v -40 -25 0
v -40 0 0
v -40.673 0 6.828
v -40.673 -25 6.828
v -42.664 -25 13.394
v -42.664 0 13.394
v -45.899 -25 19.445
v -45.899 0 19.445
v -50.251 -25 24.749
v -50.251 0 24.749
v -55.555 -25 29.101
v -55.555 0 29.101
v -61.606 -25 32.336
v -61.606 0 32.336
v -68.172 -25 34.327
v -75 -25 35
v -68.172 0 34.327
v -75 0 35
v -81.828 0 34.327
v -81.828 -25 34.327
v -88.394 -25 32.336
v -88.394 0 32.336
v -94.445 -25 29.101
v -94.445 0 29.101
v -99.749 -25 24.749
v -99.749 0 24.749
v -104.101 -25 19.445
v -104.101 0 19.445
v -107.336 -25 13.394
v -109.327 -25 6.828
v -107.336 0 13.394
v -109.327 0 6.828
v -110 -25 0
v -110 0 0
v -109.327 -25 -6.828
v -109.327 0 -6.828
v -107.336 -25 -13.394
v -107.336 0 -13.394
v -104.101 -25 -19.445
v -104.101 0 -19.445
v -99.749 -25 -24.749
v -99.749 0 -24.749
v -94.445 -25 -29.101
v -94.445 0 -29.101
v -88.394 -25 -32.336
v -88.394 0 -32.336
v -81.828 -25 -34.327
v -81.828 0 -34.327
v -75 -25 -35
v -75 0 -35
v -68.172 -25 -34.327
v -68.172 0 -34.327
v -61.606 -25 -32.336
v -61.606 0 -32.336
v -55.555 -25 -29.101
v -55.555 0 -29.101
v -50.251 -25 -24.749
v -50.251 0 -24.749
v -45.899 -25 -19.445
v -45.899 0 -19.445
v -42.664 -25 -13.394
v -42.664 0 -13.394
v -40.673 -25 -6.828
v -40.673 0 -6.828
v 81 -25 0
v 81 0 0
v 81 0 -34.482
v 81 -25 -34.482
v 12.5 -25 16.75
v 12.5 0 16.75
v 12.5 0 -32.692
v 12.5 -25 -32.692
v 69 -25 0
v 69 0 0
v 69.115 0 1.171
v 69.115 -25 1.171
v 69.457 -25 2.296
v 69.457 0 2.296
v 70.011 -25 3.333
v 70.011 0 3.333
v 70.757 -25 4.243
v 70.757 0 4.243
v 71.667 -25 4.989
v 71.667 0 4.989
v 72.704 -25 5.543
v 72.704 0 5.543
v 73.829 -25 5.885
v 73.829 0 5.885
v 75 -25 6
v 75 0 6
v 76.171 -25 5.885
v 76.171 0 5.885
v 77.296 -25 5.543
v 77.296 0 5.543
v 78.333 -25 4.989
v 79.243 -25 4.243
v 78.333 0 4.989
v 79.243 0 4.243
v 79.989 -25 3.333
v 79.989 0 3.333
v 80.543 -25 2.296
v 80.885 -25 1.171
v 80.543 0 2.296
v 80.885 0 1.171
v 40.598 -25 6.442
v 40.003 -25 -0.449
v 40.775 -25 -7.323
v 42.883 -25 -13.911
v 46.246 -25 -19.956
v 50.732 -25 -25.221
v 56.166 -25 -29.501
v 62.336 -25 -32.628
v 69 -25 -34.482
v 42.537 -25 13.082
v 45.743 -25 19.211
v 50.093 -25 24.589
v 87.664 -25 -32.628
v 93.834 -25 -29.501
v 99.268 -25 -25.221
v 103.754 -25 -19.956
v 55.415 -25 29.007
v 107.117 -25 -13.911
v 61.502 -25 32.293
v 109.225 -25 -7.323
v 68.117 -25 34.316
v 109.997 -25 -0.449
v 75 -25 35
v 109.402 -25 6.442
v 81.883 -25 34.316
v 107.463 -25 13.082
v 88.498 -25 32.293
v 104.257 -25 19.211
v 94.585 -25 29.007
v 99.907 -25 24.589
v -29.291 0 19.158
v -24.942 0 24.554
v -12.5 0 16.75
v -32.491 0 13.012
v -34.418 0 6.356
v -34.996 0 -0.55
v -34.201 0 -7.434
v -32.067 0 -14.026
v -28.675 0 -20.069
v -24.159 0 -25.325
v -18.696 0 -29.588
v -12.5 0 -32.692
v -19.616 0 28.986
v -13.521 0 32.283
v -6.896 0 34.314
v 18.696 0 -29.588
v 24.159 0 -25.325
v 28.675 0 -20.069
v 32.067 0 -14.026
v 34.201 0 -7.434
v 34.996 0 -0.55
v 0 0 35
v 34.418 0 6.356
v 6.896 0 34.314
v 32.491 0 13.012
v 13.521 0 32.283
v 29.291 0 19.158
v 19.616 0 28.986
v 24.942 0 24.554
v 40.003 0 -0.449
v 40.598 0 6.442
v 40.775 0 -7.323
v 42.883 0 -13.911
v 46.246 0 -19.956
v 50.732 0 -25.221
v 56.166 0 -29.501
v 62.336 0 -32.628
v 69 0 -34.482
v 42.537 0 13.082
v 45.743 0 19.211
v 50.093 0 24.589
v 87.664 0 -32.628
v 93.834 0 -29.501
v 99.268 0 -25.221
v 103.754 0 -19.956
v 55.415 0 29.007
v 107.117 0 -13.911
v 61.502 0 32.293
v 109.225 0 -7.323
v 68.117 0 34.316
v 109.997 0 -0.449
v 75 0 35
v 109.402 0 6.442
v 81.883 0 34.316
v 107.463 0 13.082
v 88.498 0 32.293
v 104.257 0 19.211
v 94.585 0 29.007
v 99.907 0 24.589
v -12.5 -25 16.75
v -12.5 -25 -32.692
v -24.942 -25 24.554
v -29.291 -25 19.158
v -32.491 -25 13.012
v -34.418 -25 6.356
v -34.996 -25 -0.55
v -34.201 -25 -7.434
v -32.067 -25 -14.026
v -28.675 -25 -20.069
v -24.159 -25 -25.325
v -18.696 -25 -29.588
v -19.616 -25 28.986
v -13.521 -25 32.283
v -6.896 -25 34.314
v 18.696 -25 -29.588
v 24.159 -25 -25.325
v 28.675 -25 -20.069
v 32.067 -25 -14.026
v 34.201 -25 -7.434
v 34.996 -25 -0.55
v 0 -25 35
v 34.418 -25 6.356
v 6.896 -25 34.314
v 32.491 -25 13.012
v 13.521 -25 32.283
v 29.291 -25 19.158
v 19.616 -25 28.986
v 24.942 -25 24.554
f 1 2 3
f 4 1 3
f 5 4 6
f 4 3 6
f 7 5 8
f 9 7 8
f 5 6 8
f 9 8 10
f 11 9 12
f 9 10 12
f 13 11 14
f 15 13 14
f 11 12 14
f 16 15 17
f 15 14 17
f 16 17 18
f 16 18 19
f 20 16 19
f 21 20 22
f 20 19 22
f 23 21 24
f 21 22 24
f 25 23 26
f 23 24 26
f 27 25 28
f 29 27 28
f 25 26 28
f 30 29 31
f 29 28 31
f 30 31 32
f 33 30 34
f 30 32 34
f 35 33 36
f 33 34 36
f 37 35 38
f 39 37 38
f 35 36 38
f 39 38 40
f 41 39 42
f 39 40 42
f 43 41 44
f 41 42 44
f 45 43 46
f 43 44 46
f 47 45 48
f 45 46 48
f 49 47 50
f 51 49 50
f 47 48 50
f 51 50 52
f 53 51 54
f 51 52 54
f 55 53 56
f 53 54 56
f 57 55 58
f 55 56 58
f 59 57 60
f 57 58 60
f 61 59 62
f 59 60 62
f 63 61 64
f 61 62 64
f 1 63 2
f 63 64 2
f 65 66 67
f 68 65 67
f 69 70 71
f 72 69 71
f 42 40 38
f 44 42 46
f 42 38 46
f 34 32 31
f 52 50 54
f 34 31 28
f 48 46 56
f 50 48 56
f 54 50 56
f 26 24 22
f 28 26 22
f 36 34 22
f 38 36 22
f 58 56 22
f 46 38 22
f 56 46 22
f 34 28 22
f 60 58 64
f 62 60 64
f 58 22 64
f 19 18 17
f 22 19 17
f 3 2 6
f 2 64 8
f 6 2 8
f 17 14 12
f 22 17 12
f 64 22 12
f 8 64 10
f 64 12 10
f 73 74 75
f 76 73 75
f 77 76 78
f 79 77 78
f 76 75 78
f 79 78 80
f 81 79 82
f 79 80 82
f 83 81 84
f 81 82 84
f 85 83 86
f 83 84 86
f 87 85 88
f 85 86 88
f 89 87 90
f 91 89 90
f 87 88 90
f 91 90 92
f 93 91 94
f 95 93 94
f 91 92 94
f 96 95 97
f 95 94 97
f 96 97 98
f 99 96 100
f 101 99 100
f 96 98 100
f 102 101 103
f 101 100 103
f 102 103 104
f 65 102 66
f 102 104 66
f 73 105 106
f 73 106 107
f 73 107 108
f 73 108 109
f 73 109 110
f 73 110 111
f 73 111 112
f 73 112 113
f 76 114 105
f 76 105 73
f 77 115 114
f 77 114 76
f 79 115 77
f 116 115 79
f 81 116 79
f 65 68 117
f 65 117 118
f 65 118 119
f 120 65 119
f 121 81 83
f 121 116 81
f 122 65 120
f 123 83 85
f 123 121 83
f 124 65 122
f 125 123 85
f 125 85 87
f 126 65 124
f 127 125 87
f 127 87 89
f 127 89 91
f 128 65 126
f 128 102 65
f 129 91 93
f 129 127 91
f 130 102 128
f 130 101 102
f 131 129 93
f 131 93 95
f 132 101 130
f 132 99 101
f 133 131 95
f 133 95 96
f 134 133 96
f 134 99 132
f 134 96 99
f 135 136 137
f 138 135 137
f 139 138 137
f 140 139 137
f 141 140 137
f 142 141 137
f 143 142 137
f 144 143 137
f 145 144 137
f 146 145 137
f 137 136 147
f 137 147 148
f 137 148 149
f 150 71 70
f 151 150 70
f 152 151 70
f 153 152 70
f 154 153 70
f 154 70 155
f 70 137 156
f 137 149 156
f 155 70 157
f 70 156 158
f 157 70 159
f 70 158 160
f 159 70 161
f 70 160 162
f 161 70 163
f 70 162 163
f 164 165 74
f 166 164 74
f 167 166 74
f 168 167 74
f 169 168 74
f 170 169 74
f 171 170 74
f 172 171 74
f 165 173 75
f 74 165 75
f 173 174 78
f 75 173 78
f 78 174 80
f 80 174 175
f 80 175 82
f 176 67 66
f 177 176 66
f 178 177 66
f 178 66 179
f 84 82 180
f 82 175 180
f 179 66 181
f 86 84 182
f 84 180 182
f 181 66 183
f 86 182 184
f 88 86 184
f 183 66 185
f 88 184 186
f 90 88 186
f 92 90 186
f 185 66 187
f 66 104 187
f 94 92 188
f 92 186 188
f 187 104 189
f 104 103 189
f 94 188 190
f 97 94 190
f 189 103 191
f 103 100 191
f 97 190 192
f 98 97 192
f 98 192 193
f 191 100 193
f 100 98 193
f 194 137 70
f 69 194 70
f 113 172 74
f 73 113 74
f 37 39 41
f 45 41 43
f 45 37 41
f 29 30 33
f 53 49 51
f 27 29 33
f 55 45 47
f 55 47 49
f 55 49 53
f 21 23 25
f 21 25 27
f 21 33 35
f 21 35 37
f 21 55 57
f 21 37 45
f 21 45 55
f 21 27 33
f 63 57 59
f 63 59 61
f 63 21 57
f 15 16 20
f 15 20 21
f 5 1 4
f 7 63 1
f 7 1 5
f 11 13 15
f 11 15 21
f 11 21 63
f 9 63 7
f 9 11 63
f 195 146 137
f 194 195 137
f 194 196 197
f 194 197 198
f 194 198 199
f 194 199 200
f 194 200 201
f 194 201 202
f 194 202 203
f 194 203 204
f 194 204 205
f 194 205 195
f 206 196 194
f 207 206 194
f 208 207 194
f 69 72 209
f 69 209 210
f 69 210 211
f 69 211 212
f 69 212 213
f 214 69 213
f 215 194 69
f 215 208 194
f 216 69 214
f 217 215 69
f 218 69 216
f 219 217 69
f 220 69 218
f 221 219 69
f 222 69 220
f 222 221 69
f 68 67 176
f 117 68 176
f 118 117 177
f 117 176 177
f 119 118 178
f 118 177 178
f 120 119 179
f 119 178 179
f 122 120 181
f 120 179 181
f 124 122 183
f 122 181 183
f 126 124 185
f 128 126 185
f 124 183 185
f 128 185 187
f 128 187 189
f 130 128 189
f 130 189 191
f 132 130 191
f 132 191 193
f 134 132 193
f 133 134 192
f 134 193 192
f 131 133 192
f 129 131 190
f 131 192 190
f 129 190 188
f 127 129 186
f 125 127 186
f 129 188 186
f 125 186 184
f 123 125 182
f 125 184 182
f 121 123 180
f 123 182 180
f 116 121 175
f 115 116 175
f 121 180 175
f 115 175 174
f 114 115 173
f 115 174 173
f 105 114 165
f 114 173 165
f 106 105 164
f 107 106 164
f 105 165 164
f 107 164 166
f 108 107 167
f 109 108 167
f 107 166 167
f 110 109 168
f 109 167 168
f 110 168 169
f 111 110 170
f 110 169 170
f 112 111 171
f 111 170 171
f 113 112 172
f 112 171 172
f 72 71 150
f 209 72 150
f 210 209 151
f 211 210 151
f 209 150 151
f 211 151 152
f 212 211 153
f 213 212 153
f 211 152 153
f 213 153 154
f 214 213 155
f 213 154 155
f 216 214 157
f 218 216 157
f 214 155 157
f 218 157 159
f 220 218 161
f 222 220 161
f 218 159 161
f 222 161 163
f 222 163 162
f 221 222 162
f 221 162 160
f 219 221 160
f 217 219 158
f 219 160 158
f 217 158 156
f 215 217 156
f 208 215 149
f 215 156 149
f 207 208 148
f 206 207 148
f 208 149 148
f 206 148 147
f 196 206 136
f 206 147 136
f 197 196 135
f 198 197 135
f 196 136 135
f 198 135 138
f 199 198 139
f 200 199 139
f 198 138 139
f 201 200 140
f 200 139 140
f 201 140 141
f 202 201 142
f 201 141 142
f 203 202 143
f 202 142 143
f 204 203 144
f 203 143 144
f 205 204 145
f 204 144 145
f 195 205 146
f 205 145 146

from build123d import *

# Parameters (mm, degrees)
F0_R     = 35
F1_DEPTH = 25


with BuildPart() as f1:
    # F0 (on Front) → F1 (new body)
    with BuildSketch(Plane.XZ):
        with Locations((-75, 0)):
            Circle(F0_R)
        with BuildLine():
            Line((81, 0), (81, -34.481879))
            ThreePointArc((81, -34.481879), (75, 35), (69, -34.481879))
            Line((69, -34.481879), (69, 0))
            ThreePointArc((69, 0), (75, 6), (81, 0))
        make_face()
        with BuildLine():
            Line((12.5, -16.75), (12.5, -32.691742))
            ThreePointArc((12.5, -32.691742), (0, 35), (-12.5, -32.691742))
            Line((-12.5, -32.691742), (-12.5, -16.75))
            Line((-12.5, -16.75), (-12.5, 16.75))
            Line((-12.5, 16.75), (12.5, 16.75))
            Line((12.5, 16.75), (12.5, -16.75))
        make_face()
    extrude(amount=F1_DEPTH)


solid = f1.part
